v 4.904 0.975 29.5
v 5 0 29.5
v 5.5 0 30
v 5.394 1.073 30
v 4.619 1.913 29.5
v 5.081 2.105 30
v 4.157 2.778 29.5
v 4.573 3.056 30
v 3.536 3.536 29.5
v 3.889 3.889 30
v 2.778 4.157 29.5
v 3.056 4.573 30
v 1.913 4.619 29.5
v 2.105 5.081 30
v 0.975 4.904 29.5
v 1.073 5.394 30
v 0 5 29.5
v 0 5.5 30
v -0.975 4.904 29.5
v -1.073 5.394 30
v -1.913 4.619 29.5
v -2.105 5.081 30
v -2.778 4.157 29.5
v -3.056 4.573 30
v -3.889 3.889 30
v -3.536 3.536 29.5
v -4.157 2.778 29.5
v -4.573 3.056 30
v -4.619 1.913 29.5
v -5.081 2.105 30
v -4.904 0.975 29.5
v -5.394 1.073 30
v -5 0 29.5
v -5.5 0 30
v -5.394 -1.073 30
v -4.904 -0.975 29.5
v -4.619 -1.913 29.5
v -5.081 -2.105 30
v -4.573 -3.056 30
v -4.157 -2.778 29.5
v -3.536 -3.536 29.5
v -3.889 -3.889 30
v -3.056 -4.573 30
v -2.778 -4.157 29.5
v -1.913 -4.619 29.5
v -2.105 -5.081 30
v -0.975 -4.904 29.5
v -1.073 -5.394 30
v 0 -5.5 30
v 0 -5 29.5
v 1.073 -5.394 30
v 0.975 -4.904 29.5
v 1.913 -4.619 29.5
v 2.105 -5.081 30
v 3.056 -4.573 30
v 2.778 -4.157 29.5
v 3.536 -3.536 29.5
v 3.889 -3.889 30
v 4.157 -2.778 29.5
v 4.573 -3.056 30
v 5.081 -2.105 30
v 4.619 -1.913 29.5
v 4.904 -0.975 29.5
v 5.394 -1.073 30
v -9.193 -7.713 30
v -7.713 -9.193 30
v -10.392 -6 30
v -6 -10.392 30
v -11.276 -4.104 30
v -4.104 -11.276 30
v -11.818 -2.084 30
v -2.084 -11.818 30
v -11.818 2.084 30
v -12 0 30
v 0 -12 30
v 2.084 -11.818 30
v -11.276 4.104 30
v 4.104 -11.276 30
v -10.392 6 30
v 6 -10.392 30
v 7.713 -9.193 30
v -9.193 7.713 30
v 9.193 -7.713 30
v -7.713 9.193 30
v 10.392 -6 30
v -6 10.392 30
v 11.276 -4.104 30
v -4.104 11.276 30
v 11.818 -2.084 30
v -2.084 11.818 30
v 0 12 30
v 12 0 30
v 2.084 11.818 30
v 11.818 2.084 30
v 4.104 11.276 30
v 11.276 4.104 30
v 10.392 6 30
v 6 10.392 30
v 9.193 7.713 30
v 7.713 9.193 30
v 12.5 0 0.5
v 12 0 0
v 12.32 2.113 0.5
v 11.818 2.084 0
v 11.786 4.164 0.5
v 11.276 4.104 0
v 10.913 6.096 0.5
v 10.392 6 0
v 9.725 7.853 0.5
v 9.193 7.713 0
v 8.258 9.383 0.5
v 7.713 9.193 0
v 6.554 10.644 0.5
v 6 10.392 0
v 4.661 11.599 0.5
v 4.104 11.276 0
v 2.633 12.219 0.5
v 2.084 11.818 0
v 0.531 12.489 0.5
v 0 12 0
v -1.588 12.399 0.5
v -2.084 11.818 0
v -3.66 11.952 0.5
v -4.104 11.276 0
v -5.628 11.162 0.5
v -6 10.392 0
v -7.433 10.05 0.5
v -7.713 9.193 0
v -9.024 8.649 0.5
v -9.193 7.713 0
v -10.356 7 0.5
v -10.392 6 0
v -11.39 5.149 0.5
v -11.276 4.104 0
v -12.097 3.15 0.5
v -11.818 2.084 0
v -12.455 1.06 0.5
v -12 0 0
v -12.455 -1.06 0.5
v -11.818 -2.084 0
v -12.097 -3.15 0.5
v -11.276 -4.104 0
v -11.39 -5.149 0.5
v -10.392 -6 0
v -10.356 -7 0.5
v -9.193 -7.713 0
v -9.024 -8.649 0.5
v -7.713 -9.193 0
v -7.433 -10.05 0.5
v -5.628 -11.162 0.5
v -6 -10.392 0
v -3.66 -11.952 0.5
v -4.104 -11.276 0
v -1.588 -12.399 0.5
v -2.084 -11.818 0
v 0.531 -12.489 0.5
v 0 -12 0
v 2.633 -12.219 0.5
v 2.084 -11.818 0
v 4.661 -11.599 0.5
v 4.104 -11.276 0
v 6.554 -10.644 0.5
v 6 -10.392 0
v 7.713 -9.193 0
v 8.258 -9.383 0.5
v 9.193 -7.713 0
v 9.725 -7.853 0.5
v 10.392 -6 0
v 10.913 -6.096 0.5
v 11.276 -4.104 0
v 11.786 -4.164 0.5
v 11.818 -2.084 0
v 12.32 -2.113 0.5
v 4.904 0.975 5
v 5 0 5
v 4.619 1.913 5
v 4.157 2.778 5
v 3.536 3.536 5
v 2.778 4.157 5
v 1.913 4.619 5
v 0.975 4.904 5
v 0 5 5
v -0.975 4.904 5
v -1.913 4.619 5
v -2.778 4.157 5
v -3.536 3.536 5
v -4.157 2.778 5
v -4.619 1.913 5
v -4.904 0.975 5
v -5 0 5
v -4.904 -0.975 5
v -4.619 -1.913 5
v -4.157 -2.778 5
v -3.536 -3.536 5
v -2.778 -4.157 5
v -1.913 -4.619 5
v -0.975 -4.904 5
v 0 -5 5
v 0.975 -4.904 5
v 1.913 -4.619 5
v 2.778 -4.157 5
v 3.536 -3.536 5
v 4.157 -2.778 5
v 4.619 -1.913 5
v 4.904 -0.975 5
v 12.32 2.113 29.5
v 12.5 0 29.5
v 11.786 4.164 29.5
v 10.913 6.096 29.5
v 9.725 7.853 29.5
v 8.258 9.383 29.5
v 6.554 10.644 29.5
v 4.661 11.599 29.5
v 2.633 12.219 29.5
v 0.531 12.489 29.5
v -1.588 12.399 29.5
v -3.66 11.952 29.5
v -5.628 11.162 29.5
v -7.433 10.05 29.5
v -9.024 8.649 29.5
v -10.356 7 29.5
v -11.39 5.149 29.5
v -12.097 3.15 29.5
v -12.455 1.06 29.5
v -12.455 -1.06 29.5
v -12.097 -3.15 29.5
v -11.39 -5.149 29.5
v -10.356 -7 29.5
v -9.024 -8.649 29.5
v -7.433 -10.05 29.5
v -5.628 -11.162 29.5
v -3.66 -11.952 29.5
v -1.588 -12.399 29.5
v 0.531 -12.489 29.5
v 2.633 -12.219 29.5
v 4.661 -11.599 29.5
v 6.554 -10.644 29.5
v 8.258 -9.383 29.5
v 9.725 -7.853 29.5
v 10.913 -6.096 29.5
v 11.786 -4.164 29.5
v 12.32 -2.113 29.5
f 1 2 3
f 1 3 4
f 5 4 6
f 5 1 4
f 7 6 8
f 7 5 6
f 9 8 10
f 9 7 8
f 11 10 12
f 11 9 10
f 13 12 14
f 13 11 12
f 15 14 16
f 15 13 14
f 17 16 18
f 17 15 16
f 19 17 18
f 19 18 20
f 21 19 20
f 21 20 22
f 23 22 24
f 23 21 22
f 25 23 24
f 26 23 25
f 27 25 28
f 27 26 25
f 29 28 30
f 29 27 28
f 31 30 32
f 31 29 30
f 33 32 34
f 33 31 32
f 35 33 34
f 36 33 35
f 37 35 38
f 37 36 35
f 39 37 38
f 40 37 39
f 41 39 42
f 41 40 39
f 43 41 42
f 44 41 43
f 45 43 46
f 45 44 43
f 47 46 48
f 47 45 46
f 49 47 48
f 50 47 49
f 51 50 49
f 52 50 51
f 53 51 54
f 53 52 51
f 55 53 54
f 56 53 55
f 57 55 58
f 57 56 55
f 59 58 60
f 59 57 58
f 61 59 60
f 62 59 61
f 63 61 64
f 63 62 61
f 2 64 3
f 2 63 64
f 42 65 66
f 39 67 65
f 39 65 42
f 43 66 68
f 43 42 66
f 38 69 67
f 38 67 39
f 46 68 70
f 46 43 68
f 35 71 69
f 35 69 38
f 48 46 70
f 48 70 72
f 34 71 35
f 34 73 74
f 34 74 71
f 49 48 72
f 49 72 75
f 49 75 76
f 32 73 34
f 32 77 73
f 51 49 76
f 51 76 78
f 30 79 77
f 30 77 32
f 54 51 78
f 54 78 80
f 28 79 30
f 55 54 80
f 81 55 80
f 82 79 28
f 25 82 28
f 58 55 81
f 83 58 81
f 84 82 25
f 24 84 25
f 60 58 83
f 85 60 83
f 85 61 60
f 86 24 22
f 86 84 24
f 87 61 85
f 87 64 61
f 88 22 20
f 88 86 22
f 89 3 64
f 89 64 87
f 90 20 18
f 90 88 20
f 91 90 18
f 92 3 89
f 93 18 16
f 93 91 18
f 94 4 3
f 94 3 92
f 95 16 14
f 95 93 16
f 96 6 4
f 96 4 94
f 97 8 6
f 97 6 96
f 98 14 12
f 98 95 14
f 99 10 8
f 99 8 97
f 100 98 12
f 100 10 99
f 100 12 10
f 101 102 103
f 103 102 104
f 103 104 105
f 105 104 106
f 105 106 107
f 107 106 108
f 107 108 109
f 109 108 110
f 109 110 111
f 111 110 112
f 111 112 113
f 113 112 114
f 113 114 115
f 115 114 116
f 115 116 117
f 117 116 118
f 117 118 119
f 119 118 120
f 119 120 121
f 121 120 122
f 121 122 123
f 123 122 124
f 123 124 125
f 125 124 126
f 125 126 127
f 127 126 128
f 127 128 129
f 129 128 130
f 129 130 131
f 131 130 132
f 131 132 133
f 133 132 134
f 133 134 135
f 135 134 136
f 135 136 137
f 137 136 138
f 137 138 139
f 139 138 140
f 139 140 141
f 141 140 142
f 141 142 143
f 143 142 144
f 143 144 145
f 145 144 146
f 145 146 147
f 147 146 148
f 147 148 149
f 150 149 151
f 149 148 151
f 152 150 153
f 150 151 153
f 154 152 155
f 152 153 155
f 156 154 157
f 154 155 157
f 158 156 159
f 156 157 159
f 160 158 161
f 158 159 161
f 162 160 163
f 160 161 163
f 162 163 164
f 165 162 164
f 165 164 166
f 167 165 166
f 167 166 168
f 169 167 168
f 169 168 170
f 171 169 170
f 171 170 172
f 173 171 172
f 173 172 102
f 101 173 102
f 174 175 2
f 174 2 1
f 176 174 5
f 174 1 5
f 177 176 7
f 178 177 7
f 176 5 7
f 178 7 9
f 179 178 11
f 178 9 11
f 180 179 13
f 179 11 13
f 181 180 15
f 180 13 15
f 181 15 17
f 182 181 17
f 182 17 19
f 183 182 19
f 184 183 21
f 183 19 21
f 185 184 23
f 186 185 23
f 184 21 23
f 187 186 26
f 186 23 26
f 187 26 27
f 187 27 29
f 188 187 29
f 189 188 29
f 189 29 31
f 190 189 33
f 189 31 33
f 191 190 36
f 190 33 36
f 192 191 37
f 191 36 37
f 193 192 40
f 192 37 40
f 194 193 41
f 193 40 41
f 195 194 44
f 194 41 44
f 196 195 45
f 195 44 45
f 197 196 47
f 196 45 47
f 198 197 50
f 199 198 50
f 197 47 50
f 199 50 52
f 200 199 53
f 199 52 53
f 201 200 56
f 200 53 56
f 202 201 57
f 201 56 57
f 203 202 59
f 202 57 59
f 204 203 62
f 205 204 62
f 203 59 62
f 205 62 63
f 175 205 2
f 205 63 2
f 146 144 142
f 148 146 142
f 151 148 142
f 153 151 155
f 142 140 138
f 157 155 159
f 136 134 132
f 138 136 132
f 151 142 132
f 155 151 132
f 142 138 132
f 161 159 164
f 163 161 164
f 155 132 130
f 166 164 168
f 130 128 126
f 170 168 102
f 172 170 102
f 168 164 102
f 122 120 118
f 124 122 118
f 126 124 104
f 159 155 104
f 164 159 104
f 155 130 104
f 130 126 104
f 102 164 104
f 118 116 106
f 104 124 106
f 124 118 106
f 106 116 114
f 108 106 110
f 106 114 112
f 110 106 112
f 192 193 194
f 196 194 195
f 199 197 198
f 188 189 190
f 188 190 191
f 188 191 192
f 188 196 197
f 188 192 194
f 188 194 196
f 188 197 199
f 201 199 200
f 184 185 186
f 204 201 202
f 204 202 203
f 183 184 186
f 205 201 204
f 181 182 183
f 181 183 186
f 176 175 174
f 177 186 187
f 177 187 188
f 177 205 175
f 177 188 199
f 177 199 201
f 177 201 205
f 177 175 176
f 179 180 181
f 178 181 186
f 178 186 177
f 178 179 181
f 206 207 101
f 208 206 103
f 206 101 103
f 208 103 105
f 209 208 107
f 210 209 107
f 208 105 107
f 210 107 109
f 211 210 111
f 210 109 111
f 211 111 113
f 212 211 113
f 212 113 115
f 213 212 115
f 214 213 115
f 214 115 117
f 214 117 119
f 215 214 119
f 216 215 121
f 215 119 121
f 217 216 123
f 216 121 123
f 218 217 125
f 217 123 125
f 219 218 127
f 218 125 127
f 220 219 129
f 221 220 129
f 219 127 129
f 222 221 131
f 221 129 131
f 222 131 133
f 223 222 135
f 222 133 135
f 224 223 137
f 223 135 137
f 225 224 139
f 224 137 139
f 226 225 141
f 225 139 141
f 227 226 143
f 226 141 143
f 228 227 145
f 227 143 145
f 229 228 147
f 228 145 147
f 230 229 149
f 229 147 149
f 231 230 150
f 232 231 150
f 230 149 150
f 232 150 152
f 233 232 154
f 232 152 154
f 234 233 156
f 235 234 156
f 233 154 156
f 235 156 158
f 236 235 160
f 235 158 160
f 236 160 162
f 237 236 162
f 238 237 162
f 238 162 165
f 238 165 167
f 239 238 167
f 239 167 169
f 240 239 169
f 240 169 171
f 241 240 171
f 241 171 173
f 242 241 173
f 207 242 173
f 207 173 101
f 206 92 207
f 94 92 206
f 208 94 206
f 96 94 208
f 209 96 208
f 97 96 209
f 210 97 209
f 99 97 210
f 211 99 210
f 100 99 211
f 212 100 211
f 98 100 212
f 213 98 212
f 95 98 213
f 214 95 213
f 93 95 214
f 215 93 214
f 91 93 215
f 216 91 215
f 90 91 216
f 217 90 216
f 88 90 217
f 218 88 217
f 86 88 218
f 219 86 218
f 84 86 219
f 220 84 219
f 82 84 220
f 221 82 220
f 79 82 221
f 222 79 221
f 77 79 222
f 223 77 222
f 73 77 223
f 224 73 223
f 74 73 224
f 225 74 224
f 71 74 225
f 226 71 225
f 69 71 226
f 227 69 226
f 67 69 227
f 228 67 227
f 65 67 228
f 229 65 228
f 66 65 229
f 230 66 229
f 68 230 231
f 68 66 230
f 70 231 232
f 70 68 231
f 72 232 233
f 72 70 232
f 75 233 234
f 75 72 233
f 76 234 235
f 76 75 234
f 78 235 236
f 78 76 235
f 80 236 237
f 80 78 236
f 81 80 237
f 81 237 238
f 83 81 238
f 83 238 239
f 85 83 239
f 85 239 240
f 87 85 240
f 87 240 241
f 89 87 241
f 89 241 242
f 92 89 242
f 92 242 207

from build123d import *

# Parameters (mm, degrees)
IZIM1_R                     = 12.5
Y_KSEKLIK_EKSTR_ZYON1_DEPTH = 30
IZIM2_R                     = 5
KES_EKSTR_ZYON1_DEPTH       = 25
PAH1_SIZE                   = 0.5


with BuildPart() as part:
    # Çizim1 → Yükseklik-Ekstrüzyon1 (new body)
    with BuildSketch(Plane.XY):
        Circle(IZIM1_R)
    extrude(amount=Y_KSEKLIK_EKSTR_ZYON1_DEPTH)

    # Çizim2 → Kes-Ekstrüzyon1 (cut)
    with BuildSketch(Plane.XY.offset(30)):
        Circle(IZIM2_R)
    extrude(amount=-KES_EKSTR_ZYON1_DEPTH, mode=Mode.SUBTRACT)

    # Pah1
    pah1_edges = [part.edges().sort_by_distance(p)[0] for p in [
        (-12.5, 0, 0),
        (-12.5, 0, 30),
        (-5, 0, 30),
    ]]
    chamfer(pah1_edges, length=PAH1_SIZE)


solid = part.part
